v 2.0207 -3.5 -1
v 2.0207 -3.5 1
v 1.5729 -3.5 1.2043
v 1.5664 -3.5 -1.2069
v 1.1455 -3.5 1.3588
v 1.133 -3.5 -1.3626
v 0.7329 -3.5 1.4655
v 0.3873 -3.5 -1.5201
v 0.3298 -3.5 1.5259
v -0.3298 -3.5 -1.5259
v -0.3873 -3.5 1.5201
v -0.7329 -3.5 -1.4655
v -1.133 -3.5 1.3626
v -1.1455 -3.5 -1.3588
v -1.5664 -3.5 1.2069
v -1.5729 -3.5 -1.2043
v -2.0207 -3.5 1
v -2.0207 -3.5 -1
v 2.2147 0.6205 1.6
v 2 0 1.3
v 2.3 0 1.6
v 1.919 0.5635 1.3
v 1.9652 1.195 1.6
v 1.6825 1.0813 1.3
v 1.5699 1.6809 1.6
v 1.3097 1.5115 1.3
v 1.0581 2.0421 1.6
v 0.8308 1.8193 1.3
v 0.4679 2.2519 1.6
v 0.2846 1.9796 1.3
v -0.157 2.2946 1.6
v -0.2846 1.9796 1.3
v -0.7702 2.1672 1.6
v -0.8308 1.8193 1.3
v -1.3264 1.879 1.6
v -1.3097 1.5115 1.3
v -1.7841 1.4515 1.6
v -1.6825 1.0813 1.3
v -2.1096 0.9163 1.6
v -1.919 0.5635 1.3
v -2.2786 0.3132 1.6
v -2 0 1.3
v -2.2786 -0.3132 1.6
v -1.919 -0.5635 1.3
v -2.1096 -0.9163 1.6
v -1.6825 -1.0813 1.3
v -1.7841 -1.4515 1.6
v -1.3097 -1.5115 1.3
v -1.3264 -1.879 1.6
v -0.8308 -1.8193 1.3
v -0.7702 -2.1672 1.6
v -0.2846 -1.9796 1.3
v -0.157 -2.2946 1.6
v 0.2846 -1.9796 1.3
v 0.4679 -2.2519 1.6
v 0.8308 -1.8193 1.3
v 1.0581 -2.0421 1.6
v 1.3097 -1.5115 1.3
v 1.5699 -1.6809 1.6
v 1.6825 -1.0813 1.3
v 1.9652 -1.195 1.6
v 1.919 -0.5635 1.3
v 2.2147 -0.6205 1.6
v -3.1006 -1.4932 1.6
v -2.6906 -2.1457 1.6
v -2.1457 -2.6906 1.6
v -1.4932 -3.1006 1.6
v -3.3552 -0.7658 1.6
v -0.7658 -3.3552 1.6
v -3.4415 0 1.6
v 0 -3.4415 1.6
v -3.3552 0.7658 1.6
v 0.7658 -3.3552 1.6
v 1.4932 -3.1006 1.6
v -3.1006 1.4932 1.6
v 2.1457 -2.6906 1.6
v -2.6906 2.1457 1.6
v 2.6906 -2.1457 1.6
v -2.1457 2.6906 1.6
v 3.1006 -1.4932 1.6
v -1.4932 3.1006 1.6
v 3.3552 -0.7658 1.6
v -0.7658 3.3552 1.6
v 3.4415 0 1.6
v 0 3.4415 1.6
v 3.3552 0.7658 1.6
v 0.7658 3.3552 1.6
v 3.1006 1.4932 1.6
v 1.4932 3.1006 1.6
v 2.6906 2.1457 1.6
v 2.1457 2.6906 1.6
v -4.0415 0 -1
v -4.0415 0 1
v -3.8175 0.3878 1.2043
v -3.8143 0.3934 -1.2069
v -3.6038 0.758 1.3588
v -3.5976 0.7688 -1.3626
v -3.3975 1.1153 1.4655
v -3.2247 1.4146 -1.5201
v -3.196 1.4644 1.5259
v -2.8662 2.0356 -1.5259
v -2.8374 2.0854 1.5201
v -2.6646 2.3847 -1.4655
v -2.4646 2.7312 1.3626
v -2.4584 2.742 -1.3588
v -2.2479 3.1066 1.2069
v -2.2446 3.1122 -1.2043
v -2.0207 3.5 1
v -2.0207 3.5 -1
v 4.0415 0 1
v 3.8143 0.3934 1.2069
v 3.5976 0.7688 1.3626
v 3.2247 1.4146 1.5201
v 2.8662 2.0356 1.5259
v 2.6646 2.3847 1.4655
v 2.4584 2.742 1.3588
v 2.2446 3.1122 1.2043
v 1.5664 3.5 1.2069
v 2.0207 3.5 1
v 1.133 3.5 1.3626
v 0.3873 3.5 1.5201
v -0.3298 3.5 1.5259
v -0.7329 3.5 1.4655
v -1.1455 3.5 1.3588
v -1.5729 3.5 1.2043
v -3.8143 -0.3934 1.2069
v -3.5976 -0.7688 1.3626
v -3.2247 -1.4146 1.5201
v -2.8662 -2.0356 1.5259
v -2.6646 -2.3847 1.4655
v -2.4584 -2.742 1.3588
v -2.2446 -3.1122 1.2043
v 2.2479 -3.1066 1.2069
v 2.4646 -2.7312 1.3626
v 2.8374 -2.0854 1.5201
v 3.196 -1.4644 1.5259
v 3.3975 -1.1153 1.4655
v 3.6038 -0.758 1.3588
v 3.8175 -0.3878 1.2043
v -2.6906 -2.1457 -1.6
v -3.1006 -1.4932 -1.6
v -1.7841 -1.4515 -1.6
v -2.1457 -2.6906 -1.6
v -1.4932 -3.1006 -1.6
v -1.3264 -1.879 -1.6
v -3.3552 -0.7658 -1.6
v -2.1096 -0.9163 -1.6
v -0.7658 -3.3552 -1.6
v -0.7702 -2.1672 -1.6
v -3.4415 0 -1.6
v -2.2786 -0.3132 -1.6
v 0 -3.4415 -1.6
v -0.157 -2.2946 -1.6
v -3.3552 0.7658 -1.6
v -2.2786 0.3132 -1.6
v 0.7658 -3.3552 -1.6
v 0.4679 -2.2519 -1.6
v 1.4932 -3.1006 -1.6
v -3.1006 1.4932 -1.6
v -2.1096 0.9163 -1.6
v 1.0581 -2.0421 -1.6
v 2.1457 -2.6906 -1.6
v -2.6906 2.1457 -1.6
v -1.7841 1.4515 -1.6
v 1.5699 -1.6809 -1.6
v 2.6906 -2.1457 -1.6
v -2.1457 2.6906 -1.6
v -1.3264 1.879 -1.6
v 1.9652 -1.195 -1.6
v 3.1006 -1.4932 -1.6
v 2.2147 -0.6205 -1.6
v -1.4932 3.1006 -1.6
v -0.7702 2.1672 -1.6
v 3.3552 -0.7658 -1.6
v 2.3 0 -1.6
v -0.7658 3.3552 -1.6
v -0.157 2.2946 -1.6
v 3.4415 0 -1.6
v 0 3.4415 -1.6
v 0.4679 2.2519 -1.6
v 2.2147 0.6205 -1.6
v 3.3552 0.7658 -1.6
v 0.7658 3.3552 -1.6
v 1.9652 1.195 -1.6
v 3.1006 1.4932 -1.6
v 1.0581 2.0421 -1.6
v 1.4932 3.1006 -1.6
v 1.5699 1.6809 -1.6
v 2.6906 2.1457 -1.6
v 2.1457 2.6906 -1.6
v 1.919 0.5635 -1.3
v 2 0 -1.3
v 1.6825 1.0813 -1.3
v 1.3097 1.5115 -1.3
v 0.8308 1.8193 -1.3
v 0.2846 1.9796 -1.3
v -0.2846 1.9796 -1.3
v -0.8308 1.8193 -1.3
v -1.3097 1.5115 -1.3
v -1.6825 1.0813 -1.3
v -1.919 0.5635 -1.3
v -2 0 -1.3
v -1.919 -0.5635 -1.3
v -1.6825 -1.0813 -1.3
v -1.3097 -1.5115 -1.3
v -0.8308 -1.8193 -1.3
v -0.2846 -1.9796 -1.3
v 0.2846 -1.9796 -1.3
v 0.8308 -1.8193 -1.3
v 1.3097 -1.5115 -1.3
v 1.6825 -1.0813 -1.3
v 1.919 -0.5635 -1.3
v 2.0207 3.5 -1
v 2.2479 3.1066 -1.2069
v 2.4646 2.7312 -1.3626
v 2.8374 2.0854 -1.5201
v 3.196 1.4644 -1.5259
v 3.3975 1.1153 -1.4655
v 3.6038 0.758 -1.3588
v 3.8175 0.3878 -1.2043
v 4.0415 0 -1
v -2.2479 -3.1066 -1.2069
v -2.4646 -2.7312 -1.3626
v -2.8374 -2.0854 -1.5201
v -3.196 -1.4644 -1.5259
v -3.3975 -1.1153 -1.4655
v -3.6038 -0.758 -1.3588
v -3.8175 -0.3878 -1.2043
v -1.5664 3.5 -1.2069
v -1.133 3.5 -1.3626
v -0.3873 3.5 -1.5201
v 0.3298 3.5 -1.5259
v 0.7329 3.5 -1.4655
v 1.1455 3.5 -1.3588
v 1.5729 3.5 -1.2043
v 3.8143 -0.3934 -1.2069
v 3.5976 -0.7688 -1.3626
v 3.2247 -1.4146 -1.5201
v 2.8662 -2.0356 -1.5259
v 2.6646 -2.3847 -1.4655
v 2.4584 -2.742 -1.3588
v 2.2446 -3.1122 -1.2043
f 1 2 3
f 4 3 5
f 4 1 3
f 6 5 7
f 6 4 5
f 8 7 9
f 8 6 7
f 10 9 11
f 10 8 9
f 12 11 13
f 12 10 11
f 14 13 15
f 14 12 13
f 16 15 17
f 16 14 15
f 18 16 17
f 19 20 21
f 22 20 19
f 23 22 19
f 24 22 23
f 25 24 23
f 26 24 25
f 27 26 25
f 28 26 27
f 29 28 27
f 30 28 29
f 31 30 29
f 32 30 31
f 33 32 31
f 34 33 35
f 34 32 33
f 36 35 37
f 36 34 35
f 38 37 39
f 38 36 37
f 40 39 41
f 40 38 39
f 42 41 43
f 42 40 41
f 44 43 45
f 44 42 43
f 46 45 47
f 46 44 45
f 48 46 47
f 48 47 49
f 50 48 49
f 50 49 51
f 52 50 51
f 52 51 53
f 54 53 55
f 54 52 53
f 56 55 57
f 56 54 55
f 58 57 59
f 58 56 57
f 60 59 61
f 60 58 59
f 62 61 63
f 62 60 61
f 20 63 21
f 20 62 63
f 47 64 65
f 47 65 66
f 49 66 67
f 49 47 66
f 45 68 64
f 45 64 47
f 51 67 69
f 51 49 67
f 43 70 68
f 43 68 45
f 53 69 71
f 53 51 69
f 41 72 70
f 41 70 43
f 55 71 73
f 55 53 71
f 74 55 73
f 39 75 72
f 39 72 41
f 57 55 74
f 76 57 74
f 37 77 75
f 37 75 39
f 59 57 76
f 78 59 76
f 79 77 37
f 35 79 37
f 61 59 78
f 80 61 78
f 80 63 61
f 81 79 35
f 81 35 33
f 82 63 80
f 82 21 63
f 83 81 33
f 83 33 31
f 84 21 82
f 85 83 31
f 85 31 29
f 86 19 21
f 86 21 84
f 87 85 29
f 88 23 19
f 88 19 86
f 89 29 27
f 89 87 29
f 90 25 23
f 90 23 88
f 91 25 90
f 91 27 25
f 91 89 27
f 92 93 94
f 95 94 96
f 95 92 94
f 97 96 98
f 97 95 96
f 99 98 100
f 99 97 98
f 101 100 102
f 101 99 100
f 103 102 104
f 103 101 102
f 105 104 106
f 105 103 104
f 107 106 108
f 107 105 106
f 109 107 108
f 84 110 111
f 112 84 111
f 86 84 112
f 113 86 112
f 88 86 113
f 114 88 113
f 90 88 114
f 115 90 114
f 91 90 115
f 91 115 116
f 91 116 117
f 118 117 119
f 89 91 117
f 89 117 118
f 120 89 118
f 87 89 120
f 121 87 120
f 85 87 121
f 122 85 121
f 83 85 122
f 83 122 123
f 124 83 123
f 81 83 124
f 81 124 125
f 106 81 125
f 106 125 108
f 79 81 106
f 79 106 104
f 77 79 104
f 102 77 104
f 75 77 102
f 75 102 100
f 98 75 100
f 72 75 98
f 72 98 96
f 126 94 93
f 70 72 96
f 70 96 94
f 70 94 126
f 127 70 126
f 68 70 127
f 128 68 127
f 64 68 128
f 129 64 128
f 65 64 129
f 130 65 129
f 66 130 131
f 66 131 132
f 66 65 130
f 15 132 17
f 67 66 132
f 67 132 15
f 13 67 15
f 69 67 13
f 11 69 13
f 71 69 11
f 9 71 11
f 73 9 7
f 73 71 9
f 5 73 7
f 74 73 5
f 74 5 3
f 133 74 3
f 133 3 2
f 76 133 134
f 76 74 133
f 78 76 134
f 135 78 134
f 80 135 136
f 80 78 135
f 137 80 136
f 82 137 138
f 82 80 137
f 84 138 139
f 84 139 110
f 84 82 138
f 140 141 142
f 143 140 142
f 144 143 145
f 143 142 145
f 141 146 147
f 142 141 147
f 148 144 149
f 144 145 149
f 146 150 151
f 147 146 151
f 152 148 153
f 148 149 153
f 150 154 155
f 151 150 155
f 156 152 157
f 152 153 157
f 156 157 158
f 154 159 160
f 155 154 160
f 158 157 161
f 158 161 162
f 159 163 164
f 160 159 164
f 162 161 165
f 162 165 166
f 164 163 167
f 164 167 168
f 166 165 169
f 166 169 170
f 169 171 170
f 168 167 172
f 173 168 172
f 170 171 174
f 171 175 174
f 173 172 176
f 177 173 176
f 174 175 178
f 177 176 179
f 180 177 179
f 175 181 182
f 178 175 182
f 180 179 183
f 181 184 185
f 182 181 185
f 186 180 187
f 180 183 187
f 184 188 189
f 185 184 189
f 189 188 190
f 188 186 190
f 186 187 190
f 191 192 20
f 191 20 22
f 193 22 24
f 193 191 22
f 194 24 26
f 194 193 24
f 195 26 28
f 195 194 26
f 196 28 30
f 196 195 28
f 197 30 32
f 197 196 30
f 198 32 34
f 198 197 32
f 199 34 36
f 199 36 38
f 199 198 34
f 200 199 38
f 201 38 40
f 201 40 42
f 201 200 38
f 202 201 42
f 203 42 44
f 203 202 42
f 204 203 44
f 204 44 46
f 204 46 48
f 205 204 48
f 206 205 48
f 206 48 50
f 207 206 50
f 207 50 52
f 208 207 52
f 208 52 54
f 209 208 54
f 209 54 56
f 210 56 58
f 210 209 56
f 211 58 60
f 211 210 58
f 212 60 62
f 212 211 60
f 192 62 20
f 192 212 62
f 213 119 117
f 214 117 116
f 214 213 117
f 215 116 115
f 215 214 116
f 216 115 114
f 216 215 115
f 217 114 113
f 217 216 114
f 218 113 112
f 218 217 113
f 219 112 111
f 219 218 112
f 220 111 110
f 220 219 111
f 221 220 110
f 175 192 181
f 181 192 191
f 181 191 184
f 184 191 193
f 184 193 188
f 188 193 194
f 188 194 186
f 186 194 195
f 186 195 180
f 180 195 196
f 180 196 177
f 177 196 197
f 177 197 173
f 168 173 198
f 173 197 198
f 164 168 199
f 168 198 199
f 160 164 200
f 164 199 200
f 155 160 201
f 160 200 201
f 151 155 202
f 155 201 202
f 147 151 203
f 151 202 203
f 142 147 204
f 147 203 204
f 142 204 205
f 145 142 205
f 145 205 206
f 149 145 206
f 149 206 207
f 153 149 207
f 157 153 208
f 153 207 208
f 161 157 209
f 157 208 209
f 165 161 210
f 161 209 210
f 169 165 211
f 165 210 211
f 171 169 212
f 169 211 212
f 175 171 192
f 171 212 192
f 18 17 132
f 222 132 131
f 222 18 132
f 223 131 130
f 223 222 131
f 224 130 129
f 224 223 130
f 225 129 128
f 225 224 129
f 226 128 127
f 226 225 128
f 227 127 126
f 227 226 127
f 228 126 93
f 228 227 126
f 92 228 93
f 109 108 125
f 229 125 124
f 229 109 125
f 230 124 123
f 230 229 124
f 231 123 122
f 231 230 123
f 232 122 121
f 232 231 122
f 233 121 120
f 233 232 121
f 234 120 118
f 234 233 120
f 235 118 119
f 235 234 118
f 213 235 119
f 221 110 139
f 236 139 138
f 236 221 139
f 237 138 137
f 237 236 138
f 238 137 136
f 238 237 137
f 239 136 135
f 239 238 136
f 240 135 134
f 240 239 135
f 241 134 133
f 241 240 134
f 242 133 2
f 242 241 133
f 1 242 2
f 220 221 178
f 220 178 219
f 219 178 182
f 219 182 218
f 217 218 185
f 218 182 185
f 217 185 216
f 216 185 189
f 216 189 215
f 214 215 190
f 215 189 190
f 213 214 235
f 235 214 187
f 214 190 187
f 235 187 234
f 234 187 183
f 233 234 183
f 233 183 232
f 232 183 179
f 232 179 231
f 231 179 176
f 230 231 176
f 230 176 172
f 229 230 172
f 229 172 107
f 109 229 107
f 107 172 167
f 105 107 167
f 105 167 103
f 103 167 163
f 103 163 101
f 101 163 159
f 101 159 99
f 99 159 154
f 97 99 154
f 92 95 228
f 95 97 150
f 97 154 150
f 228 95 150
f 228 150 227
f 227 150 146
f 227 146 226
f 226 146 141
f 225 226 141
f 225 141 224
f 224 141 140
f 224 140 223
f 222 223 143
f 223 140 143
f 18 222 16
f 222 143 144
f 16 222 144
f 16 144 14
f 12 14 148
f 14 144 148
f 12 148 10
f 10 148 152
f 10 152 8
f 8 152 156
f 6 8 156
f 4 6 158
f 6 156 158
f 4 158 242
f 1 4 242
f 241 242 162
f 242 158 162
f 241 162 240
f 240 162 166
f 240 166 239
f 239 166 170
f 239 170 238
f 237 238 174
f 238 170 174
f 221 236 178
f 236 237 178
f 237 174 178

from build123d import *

# Parameters (mm, degrees)
SKETCH1_R           = 4.041451884
BOSS_EXTRUDE1_DEPTH = 1.6
CHAMFER1_SIZE       = 0.6
SKETCH2_R           = 2
CUT_EXTRUDE1_DEPTH  = 7.550318058
CHAMFER2_SIZE       = 0.3


with BuildPart() as part:
    # Sketch1 → Boss-Extrude1 (new, symmetric)
    with BuildSketch(Plane.XY):
        Circle(SKETCH1_R)
    extrude(amount=BOSS_EXTRUDE1_DEPTH, both=True)

    # Chamfer1
    chamfer1_edges = [part.edges().sort_by_distance(p)[0] for p in [
        (-4.041451884, 0, 1.6),
        (-4.041451884, 0, -1.6),
    ]]
    chamfer(chamfer1_edges, length=CHAMFER1_SIZE)

    # Sketch2 → Cut-Extrude1 (cut, through all)
    with BuildSketch(Plane.XY.offset(1.6)):
        with BuildLine():
            ThreePointArc((4.041451884, 0), (3.5, 2.020725942), (2.020725942, 3.5))
            Line((2.020725942, 3.5), (4.041451884, 0))
        make_face()
        with BuildLine():
            Line((-2.020725942, 3.5), (2.020725942, 3.5))
            ThreePointArc((2.020725942, 3.5), (0, 4.041451884), (-2.020725942, 3.5))
        make_face()
        with BuildLine():
            Line((-4.041451884, 0), (-2.020725942, 3.5))
            ThreePointArc((-2.020725942, 3.5), (-3.5, 2.020725942), (-4.041451884, 0))
        make_face()
        with BuildLine():
            ThreePointArc((2.020725942, -3.5), (3.5, -2.020725942), (4.041451884, 0))
            Line((4.041451884, 0), (2.020725942, -3.5))
        make_face()
        with BuildLine():
            Line((-2.020725942, -3.5), (-4.041451884, 0))
            ThreePointArc((-4.041451884, 0), (-3.5, -2.020725942), (-2.020725942, -3.5))
        make_face()
        with BuildLine():
            ThreePointArc((-2.020725942, -3.5), (0, -4.041451884), (2.020725942, -3.5))
            Line((2.020725942, -3.5), (-2.020725942, -3.5))
        make_face()
        Circle(SKETCH2_R)
    extrude(amount=-CUT_EXTRUDE1_DEPTH, mode=Mode.SUBTRACT)

    # Chamfer2
    chamfer2_edges = [part.edges().sort_by_distance(p)[0] for p in [
        (-2, 0, 1.6),
        (-2, 0, -1.6),
    ]]
    chamfer(chamfer2_edges, length=CHAMFER2_SIZE)


solid = part.part
